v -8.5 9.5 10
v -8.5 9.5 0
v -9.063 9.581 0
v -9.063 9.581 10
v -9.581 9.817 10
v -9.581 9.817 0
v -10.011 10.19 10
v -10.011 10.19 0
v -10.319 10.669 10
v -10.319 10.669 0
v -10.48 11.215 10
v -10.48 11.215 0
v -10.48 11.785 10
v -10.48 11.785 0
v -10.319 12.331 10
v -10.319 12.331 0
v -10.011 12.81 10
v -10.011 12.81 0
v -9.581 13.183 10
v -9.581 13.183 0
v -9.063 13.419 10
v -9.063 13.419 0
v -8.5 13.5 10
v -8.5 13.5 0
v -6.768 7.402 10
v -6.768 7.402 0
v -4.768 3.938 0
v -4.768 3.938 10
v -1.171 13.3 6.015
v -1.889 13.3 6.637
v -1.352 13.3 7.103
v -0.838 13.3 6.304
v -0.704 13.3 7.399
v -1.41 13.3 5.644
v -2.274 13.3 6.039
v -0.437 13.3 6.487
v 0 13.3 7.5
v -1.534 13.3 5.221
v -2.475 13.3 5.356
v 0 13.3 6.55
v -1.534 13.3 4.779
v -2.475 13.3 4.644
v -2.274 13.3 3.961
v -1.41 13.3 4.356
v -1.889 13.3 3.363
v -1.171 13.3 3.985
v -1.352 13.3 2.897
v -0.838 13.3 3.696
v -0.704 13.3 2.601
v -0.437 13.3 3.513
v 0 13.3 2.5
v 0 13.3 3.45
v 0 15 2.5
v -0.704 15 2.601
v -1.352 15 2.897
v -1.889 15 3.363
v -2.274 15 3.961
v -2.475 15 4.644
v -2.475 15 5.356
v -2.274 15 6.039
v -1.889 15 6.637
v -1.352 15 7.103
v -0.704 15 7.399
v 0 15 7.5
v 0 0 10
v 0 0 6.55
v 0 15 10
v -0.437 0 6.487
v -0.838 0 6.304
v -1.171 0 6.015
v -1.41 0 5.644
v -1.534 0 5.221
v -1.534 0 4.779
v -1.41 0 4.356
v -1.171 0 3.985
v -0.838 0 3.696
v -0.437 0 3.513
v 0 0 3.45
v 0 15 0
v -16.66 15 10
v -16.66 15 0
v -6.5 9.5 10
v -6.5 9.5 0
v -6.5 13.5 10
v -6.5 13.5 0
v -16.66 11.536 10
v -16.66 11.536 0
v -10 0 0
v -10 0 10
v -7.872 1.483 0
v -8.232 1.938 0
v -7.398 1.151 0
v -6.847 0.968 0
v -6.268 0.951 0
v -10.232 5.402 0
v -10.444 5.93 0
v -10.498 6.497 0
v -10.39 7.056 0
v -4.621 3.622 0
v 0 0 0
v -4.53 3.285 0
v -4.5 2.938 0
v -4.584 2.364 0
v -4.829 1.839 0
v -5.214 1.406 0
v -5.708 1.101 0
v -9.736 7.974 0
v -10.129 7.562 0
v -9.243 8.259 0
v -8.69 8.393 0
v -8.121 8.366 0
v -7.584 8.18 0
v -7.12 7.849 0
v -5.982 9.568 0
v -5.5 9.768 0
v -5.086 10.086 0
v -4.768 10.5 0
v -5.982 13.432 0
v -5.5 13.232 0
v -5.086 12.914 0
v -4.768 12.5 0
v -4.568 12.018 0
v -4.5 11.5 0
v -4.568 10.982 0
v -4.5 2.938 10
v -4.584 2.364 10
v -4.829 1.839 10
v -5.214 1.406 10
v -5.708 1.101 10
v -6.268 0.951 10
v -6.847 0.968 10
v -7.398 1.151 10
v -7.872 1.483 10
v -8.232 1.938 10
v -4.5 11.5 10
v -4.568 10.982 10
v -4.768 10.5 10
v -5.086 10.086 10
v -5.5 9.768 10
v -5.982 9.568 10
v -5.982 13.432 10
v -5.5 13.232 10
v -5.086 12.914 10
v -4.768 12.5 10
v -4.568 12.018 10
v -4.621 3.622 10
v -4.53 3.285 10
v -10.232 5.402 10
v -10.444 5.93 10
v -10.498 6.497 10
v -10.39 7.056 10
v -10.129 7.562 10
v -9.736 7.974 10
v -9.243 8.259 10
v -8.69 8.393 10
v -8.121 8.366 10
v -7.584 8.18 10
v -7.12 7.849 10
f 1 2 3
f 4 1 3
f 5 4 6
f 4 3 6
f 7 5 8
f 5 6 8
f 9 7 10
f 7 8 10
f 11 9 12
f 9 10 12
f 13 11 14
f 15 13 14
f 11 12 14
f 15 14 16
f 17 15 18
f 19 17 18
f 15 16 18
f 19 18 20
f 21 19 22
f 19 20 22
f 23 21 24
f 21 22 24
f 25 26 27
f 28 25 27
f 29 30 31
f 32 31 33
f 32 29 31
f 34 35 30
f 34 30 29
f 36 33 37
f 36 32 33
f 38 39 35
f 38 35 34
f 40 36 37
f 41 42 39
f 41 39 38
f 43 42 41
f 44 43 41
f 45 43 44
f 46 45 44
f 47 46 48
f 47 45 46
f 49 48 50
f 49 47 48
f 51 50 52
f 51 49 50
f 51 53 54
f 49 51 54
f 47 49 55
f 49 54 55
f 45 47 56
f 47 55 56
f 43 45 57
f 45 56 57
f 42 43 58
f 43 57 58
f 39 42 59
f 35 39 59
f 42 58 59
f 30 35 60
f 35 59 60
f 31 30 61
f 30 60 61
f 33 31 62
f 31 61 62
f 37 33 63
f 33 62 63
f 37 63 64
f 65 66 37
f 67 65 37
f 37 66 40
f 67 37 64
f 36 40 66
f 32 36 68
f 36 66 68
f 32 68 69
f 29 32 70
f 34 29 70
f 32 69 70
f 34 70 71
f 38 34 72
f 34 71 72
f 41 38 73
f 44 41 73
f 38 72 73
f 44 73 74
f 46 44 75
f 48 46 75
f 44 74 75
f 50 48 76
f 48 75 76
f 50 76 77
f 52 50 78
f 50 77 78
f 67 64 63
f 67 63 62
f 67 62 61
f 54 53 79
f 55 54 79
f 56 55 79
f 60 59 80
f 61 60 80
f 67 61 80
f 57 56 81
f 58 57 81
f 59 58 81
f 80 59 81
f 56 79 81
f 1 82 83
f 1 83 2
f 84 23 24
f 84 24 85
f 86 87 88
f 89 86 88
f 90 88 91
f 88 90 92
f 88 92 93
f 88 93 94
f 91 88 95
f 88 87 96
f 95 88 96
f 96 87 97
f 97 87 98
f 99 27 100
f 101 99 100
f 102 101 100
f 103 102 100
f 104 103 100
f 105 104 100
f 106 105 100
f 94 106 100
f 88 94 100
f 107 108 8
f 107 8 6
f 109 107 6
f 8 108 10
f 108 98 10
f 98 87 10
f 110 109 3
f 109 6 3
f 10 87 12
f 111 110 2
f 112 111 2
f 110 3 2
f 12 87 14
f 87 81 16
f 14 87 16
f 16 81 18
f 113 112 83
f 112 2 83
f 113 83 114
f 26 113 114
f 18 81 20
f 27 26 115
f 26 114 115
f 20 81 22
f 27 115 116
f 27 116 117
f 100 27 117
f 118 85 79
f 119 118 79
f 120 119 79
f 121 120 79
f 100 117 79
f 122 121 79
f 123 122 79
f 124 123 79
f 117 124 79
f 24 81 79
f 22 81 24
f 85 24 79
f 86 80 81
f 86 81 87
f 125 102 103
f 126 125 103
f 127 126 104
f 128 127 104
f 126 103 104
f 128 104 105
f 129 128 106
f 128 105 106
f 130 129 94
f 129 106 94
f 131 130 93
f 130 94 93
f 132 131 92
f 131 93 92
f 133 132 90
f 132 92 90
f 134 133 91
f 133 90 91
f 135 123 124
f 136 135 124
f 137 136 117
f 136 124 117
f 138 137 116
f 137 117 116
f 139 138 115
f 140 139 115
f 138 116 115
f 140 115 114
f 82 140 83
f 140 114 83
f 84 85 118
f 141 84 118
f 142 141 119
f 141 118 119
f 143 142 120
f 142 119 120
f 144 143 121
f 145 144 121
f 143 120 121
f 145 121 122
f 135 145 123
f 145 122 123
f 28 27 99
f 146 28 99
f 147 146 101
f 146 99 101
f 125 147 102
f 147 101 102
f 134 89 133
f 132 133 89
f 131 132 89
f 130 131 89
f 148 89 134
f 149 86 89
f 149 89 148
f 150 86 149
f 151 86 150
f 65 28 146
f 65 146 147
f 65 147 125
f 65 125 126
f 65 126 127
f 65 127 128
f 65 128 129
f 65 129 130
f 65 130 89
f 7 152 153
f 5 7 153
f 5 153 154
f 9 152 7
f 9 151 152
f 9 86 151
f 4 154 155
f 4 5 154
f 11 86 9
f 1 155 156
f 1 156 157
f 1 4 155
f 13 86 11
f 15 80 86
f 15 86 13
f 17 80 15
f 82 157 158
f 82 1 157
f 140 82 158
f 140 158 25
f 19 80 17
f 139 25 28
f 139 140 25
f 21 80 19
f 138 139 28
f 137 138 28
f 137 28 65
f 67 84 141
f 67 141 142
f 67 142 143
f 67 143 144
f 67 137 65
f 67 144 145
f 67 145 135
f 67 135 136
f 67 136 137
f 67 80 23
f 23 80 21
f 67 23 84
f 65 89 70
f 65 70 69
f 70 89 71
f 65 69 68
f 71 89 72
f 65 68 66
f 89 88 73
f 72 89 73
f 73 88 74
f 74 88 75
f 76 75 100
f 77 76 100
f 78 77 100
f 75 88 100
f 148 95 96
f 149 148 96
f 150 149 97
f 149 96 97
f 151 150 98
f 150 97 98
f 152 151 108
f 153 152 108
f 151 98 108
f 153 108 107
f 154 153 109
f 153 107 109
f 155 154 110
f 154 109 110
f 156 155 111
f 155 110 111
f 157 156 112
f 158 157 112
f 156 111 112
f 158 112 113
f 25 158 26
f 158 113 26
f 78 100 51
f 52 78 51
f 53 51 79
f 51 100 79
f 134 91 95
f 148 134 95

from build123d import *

# Parameters (mm, degrees)
EXTRUDE_1_DEPTH     = 10
SKETCH_2_R          = 1.55
CUT_EXTRUDE_1_DEPTH = 26.946195882
SKETCH_3_R          = 2.5
CUT_EXTRUDE_2_DEPTH = 1.7
CUT_EXTRUDE_3_DEPTH = 26.946195882


with BuildPart() as part:
    # 스케치1 → 보스-돌출1 (new body)
    with BuildSketch(Plane.XY):
        Polygon((-10, 0), (0, 0), (0, 15), (-18.660254038, 15), align=None)
        with BuildLine():
            ThreePointArc((-10.232050808, 5.401923789), (-9.5, 8.133974596), (-6.767949192, 7.401923789))
            Line((-6.767949192, 7.401923789), (-4.767949192, 3.937822174))
            ThreePointArc((-4.767949192, 3.937822174), (-4.568148347, 3.455460264), (-4.5, 2.937822174))
            ThreePointArc((-4.5, 2.937822174), (-5.98236191, 1.005970521), (-8.232050808, 1.937822174))
            Line((-8.232050808, 1.937822174), (-10.232050808, 5.401923789))
        make_face(mode=Mode.SUBTRACT)
        with BuildLine():
            ThreePointArc((-8.5, 9.5), (-10.5, 11.5), (-8.5, 13.5))
            Line((-8.5, 13.5), (-6.5, 13.5))
            ThreePointArc((-6.5, 13.5), (-5.085786438, 12.914213562), (-4.5, 11.5))
            ThreePointArc((-4.5, 11.5), (-5.085786438, 10.085786438), (-6.5, 9.5))
            Line((-6.5, 9.5), (-8.5, 9.5))
        make_face(mode=Mode.SUBTRACT)
    extrude(amount=EXTRUDE_1_DEPTH)

    # 스케치2 → 컷-돌출1 (cut, through all)
    with BuildSketch(Plane.XZ):
        with Locations((0, 5)):
            Circle(SKETCH_2_R)
    extrude(amount=-CUT_EXTRUDE_1_DEPTH, mode=Mode.SUBTRACT)

    # 스케치3 → 컷-돌출2 (cut)
    with BuildSketch(Plane(origin=(0, 15, 0), x_dir=(1, 0, 0), z_dir=(0, 1, 0))):
        with Locations((0, -5)):
            Circle(SKETCH_3_R)
    extrude(amount=-CUT_EXTRUDE_2_DEPTH, mode=Mode.SUBTRACT)

    # 스케치4 → 컷-돌출3 (cut, through all)
    with BuildSketch(Plane.XY.offset(10)):
        Polygon((-18.660254038, 15), (-16.660254038, 15), (-16.660254038, 11.535898385), align=None)
    extrude(amount=-CUT_EXTRUDE_3_DEPTH, mode=Mode.SUBTRACT)


solid = part.part
